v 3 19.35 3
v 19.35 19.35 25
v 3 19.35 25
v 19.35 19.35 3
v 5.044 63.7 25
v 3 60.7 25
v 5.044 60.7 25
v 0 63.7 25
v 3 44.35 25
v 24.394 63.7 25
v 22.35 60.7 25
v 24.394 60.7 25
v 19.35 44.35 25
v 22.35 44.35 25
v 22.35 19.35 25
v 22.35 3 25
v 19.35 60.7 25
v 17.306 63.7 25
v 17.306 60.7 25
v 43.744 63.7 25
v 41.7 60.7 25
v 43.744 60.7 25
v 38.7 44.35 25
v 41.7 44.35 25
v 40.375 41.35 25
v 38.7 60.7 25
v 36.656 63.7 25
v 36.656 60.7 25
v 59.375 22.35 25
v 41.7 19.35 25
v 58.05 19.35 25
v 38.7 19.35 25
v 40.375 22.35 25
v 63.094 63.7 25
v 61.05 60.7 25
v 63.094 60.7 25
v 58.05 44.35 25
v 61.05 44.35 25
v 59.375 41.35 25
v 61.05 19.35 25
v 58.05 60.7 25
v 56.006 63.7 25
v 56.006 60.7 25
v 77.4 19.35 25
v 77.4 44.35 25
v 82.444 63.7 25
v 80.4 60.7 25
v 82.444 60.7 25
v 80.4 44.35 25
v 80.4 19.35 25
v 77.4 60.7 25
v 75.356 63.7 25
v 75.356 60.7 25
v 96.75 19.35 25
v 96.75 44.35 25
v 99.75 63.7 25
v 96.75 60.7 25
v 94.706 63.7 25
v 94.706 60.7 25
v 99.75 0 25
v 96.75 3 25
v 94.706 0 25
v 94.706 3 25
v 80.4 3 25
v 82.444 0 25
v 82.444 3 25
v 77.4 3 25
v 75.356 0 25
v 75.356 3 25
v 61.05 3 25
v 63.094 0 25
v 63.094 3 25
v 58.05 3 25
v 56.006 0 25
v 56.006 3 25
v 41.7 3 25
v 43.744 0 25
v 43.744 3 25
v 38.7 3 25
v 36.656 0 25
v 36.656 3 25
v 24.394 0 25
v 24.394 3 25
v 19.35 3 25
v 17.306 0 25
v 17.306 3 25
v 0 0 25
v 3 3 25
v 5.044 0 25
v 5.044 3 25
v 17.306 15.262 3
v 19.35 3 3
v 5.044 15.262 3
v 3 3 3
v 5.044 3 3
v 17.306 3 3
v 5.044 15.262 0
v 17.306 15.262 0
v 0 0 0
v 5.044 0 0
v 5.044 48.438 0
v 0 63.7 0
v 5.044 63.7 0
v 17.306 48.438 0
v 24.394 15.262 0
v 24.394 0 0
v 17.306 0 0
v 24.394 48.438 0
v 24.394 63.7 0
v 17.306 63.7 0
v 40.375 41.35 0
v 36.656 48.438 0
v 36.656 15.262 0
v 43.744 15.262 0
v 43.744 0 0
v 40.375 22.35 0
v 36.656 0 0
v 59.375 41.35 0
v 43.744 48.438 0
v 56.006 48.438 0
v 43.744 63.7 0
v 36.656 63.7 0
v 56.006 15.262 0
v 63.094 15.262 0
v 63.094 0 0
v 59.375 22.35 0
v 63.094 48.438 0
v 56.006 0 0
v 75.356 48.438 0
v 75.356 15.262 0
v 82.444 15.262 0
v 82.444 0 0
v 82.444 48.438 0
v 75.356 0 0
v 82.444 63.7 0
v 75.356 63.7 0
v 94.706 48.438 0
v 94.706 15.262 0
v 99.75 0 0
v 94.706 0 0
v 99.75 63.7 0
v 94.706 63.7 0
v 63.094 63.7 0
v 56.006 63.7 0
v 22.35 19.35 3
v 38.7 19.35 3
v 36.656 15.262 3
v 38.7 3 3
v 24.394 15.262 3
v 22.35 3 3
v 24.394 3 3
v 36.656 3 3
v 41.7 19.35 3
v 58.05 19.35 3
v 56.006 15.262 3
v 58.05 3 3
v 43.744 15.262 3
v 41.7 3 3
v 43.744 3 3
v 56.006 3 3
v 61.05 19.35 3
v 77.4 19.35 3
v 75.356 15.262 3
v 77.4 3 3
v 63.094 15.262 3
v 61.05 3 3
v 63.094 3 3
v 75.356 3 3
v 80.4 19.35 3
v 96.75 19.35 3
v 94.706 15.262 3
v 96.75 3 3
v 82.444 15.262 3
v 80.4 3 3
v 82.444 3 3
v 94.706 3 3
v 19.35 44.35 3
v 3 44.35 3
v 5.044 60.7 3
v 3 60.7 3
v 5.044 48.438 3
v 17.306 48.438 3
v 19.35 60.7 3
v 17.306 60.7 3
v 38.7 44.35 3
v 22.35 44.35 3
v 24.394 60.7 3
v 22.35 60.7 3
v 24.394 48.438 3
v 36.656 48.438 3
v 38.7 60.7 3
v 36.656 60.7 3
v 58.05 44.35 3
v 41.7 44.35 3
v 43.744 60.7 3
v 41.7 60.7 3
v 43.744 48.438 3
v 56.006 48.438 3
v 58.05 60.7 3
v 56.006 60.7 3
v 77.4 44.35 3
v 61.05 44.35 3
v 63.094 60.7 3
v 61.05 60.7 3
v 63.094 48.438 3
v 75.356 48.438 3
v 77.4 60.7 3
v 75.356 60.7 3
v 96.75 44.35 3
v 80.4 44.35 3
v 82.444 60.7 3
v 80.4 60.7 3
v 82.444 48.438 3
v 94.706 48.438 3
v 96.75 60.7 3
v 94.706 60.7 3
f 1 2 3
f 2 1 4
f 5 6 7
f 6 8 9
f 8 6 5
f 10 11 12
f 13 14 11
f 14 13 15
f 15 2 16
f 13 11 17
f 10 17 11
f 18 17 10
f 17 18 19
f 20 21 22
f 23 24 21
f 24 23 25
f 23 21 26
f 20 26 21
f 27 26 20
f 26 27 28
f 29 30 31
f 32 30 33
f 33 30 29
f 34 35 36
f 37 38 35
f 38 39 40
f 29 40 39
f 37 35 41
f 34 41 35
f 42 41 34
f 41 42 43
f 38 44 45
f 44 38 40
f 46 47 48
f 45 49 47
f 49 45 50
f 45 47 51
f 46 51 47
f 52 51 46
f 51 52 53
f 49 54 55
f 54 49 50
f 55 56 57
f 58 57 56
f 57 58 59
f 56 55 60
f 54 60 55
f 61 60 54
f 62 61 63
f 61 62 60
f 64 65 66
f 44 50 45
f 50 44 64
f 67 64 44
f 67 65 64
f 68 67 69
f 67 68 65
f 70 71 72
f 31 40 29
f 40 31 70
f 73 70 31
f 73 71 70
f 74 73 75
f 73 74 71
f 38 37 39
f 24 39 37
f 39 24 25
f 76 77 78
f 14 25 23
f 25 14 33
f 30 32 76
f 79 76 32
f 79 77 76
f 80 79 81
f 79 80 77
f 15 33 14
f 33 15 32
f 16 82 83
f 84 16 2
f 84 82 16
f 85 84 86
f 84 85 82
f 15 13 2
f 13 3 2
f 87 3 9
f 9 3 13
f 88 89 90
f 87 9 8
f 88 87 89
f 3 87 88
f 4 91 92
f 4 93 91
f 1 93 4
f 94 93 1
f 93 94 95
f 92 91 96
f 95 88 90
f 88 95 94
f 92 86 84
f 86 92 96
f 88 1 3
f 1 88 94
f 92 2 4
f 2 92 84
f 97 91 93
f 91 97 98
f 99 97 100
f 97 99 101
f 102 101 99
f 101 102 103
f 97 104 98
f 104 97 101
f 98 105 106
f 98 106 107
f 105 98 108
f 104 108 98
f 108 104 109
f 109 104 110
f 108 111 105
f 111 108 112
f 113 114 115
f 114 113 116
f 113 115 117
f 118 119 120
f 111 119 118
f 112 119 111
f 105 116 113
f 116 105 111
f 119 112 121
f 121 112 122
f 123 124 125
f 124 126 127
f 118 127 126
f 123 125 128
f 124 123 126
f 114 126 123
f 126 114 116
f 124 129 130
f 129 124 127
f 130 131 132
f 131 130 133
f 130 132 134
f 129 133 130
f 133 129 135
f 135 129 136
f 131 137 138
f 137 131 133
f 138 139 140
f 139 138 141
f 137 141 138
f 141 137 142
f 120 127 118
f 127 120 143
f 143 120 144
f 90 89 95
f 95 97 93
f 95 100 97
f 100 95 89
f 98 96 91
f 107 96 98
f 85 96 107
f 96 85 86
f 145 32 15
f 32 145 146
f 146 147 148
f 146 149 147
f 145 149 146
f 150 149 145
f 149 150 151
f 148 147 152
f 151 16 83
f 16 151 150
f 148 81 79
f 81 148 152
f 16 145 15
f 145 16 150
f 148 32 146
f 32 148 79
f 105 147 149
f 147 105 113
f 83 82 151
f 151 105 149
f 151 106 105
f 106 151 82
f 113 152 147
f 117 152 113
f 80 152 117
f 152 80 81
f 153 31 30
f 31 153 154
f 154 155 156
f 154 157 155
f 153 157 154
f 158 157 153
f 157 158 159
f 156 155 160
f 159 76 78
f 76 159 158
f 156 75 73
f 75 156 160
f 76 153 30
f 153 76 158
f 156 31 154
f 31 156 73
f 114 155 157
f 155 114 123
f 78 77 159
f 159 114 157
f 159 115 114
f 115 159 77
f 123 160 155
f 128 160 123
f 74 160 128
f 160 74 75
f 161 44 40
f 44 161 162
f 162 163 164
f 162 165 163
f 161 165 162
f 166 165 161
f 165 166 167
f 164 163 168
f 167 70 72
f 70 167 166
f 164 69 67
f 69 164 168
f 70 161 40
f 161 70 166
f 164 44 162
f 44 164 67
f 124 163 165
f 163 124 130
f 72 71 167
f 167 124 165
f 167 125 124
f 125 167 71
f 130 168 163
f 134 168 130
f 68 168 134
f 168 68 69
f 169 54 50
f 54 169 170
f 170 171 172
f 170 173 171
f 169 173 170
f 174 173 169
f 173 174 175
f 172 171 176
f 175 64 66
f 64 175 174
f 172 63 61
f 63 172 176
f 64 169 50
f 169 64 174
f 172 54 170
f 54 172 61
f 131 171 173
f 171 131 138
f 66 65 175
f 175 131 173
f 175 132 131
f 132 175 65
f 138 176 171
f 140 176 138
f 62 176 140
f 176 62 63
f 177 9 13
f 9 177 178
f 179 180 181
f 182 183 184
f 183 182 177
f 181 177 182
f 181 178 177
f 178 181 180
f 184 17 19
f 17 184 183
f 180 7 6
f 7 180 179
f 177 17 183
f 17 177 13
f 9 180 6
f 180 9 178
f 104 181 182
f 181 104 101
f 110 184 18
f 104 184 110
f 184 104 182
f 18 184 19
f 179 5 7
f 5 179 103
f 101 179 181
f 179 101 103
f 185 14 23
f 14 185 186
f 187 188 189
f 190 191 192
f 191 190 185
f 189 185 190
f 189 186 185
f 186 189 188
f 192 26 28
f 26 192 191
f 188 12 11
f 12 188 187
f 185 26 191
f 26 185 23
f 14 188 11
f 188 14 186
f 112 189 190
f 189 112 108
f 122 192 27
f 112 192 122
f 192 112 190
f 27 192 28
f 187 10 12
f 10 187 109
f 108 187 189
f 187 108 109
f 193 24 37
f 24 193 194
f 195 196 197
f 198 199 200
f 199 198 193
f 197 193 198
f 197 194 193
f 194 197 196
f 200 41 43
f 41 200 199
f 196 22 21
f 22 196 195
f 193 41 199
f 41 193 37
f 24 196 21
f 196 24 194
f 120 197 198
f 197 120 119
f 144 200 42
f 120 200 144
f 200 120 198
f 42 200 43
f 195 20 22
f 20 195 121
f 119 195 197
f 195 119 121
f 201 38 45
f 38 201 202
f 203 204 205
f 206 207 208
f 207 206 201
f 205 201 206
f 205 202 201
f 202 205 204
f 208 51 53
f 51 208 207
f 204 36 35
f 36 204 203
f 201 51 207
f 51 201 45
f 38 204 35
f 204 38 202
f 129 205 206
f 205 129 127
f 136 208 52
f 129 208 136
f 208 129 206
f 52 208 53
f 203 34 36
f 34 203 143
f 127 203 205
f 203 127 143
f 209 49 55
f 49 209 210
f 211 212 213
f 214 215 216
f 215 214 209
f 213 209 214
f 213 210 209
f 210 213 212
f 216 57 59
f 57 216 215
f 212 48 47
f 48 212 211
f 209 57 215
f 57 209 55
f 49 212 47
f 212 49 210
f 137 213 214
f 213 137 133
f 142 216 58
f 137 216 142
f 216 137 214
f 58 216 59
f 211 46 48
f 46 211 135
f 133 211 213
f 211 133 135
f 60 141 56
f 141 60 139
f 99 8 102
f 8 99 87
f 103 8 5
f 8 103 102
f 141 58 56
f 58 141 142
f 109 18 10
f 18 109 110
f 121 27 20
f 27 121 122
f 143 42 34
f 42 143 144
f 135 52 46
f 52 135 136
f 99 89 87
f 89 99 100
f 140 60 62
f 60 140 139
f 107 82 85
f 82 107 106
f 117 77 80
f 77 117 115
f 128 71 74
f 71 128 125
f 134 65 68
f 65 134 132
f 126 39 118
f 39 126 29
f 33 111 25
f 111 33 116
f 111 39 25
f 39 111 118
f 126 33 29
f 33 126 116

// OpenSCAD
// file: ColonistsGoodsBase.scad
singleGoodPileHeight = 2.15;
singleGoodPileWidth = 15.05 + 1.3;
singleGoodPileLength = 15.05 + 1.3;
goodPileCount = 10;
goodPileHeight = (goodPileCount * singleGoodPileHeight) + .5;
module LeftGoodPile(wallThickness, totalHeight){
//    15.05 by 14.95 by 2.15

    openingSize = singleGoodPileWidth * .75;
    blockerSize = (singleGoodPileLength - openingSize) / 2;
    
    translate([wallThickness, wallThickness, totalHeight - goodPileHeight])
        cube([singleGoodPileLength, singleGoodPileWidth, goodPileHeight]);
    translate([-.00001, wallThickness + (blockerSize), 0])
        cube([wallThickness + openingSize, openingSize, totalHeight]);
}

module RightGoodPile(wallThickness, totalHeight){
    translate([0, wallThickness + wallThickness + singleGoodPileWidth, 0])
        rotate([0, 0, 180])
            LeftGoodPile(wallThickness, totalHeight);
}

module BottomGoodPile(wallThickness, totalHeight){
    translate([wallThickness + wallThickness + singleGoodPileWidth, 0, 0])
        rotate([0, 0, 90])
            LeftGoodPile(wallThickness, totalHeight);
}

module TopGoodPile(wallThickness, totalHeight){
//    translate([
//        wallThickness + wallThickness + singleGoodPileWidth,
//        wallThickness + wallThickness + singleGoodPileWidth,
//        0])
        rotate([0, 0, 270])
            LeftGoodPile(wallThickness, totalHeight);
}
// main file
include<ColonistsGoodsBase.scad>
    magnetHoleWidth = 19;
    floorThickness = 3;
    wallThickness = 3;
    height = goodPileHeight + floorThickness;
    length = 5 * singleGoodPileLength + 6 * wallThickness;
    width = (wallThickness * 2) + (singleGoodPileWidth * 2) + magnetHoleWidth + (wallThickness * 2);
    numberOfBoxes = 5;

difference() {

//    whitespace between boxes = (total length - (# of boxes * width of boxes)) / (# of boxes + 1)
//    position of box n = whitespace * n + 1 + width of box * (n)
    
    cube([length, width, height]);

    whiteSpaceBetweenBoxes = (length - (numberOfBoxes * singleGoodPileLength)) / (numberOfBoxes + 1);
    
    for(i=[0:numberOfBoxes - 1]){
        translate([((i + 1) * whiteSpaceBetweenBoxes + singleGoodPileLength * (i)) - wallThickness, 0, 0])
            BottomGoodPile(wallThickness, height);
    }
    for(i=[0:4]) {
        translate([i * (singleGoodPileLength + wallThickness), width, 0])
            TopGoodPile(wallThickness, height);
    }
    
    translate([length/2 - magnetHoleWidth/2, width/2 - magnetHoleWidth/2, 0])
        cube([magnetHoleWidth, magnetHoleWidth, height]);
}
